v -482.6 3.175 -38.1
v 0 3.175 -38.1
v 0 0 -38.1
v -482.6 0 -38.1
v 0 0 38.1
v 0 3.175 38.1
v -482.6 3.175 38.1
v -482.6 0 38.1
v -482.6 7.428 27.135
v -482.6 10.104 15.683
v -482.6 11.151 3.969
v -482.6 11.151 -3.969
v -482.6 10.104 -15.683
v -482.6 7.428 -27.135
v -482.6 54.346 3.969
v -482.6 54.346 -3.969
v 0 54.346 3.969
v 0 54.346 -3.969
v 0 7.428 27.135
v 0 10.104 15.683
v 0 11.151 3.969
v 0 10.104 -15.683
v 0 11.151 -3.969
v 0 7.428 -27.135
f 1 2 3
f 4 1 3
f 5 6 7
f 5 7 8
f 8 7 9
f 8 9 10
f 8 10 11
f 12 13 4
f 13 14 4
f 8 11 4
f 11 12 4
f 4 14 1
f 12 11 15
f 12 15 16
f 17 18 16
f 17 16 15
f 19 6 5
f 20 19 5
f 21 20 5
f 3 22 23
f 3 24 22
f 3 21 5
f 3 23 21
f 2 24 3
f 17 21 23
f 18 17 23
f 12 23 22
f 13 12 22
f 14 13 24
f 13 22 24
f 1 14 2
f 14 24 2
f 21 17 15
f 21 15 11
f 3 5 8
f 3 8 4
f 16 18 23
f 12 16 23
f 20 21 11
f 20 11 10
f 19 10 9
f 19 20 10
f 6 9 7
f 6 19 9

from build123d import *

# Parameters (mm, degrees)
BOSS_EXTRUDE2_DEPTH = 482.6


with BuildPart() as part:
    # Sketch2 → Boss-Extrude2 (new body)
    with BuildSketch(Plane(origin=(0, 0, 0), x_dir=(0, 0, -1), z_dir=(1, 0, 0))):
        with BuildLine():
            Line((0, 0), (0, 54.346487563))
            Line((0, 54.346487563), (3.96875, 54.346487563))
            Line((3.96875, 54.346487563), (3.96875, 11.151453071))
            ThreePointArc((3.96875, 11.151453071), (21.455972099, 8.967240909), (38.1, 3.175))
            Line((38.1, 3.175), (38.1, 0))
            Line((38.1, 0), (0, 0))
        make_face()
    boss_extrude2 = extrude(amount=-BOSS_EXTRUDE2_DEPTH)

    # Mirror1: Boss-Extrude2 across plane
    add(boss_extrude2.mirror(Plane(origin=(-482.6, 0, 0), x_dir=(1, 0, 0), z_dir=(0, 0, 1))))


solid = part.part
